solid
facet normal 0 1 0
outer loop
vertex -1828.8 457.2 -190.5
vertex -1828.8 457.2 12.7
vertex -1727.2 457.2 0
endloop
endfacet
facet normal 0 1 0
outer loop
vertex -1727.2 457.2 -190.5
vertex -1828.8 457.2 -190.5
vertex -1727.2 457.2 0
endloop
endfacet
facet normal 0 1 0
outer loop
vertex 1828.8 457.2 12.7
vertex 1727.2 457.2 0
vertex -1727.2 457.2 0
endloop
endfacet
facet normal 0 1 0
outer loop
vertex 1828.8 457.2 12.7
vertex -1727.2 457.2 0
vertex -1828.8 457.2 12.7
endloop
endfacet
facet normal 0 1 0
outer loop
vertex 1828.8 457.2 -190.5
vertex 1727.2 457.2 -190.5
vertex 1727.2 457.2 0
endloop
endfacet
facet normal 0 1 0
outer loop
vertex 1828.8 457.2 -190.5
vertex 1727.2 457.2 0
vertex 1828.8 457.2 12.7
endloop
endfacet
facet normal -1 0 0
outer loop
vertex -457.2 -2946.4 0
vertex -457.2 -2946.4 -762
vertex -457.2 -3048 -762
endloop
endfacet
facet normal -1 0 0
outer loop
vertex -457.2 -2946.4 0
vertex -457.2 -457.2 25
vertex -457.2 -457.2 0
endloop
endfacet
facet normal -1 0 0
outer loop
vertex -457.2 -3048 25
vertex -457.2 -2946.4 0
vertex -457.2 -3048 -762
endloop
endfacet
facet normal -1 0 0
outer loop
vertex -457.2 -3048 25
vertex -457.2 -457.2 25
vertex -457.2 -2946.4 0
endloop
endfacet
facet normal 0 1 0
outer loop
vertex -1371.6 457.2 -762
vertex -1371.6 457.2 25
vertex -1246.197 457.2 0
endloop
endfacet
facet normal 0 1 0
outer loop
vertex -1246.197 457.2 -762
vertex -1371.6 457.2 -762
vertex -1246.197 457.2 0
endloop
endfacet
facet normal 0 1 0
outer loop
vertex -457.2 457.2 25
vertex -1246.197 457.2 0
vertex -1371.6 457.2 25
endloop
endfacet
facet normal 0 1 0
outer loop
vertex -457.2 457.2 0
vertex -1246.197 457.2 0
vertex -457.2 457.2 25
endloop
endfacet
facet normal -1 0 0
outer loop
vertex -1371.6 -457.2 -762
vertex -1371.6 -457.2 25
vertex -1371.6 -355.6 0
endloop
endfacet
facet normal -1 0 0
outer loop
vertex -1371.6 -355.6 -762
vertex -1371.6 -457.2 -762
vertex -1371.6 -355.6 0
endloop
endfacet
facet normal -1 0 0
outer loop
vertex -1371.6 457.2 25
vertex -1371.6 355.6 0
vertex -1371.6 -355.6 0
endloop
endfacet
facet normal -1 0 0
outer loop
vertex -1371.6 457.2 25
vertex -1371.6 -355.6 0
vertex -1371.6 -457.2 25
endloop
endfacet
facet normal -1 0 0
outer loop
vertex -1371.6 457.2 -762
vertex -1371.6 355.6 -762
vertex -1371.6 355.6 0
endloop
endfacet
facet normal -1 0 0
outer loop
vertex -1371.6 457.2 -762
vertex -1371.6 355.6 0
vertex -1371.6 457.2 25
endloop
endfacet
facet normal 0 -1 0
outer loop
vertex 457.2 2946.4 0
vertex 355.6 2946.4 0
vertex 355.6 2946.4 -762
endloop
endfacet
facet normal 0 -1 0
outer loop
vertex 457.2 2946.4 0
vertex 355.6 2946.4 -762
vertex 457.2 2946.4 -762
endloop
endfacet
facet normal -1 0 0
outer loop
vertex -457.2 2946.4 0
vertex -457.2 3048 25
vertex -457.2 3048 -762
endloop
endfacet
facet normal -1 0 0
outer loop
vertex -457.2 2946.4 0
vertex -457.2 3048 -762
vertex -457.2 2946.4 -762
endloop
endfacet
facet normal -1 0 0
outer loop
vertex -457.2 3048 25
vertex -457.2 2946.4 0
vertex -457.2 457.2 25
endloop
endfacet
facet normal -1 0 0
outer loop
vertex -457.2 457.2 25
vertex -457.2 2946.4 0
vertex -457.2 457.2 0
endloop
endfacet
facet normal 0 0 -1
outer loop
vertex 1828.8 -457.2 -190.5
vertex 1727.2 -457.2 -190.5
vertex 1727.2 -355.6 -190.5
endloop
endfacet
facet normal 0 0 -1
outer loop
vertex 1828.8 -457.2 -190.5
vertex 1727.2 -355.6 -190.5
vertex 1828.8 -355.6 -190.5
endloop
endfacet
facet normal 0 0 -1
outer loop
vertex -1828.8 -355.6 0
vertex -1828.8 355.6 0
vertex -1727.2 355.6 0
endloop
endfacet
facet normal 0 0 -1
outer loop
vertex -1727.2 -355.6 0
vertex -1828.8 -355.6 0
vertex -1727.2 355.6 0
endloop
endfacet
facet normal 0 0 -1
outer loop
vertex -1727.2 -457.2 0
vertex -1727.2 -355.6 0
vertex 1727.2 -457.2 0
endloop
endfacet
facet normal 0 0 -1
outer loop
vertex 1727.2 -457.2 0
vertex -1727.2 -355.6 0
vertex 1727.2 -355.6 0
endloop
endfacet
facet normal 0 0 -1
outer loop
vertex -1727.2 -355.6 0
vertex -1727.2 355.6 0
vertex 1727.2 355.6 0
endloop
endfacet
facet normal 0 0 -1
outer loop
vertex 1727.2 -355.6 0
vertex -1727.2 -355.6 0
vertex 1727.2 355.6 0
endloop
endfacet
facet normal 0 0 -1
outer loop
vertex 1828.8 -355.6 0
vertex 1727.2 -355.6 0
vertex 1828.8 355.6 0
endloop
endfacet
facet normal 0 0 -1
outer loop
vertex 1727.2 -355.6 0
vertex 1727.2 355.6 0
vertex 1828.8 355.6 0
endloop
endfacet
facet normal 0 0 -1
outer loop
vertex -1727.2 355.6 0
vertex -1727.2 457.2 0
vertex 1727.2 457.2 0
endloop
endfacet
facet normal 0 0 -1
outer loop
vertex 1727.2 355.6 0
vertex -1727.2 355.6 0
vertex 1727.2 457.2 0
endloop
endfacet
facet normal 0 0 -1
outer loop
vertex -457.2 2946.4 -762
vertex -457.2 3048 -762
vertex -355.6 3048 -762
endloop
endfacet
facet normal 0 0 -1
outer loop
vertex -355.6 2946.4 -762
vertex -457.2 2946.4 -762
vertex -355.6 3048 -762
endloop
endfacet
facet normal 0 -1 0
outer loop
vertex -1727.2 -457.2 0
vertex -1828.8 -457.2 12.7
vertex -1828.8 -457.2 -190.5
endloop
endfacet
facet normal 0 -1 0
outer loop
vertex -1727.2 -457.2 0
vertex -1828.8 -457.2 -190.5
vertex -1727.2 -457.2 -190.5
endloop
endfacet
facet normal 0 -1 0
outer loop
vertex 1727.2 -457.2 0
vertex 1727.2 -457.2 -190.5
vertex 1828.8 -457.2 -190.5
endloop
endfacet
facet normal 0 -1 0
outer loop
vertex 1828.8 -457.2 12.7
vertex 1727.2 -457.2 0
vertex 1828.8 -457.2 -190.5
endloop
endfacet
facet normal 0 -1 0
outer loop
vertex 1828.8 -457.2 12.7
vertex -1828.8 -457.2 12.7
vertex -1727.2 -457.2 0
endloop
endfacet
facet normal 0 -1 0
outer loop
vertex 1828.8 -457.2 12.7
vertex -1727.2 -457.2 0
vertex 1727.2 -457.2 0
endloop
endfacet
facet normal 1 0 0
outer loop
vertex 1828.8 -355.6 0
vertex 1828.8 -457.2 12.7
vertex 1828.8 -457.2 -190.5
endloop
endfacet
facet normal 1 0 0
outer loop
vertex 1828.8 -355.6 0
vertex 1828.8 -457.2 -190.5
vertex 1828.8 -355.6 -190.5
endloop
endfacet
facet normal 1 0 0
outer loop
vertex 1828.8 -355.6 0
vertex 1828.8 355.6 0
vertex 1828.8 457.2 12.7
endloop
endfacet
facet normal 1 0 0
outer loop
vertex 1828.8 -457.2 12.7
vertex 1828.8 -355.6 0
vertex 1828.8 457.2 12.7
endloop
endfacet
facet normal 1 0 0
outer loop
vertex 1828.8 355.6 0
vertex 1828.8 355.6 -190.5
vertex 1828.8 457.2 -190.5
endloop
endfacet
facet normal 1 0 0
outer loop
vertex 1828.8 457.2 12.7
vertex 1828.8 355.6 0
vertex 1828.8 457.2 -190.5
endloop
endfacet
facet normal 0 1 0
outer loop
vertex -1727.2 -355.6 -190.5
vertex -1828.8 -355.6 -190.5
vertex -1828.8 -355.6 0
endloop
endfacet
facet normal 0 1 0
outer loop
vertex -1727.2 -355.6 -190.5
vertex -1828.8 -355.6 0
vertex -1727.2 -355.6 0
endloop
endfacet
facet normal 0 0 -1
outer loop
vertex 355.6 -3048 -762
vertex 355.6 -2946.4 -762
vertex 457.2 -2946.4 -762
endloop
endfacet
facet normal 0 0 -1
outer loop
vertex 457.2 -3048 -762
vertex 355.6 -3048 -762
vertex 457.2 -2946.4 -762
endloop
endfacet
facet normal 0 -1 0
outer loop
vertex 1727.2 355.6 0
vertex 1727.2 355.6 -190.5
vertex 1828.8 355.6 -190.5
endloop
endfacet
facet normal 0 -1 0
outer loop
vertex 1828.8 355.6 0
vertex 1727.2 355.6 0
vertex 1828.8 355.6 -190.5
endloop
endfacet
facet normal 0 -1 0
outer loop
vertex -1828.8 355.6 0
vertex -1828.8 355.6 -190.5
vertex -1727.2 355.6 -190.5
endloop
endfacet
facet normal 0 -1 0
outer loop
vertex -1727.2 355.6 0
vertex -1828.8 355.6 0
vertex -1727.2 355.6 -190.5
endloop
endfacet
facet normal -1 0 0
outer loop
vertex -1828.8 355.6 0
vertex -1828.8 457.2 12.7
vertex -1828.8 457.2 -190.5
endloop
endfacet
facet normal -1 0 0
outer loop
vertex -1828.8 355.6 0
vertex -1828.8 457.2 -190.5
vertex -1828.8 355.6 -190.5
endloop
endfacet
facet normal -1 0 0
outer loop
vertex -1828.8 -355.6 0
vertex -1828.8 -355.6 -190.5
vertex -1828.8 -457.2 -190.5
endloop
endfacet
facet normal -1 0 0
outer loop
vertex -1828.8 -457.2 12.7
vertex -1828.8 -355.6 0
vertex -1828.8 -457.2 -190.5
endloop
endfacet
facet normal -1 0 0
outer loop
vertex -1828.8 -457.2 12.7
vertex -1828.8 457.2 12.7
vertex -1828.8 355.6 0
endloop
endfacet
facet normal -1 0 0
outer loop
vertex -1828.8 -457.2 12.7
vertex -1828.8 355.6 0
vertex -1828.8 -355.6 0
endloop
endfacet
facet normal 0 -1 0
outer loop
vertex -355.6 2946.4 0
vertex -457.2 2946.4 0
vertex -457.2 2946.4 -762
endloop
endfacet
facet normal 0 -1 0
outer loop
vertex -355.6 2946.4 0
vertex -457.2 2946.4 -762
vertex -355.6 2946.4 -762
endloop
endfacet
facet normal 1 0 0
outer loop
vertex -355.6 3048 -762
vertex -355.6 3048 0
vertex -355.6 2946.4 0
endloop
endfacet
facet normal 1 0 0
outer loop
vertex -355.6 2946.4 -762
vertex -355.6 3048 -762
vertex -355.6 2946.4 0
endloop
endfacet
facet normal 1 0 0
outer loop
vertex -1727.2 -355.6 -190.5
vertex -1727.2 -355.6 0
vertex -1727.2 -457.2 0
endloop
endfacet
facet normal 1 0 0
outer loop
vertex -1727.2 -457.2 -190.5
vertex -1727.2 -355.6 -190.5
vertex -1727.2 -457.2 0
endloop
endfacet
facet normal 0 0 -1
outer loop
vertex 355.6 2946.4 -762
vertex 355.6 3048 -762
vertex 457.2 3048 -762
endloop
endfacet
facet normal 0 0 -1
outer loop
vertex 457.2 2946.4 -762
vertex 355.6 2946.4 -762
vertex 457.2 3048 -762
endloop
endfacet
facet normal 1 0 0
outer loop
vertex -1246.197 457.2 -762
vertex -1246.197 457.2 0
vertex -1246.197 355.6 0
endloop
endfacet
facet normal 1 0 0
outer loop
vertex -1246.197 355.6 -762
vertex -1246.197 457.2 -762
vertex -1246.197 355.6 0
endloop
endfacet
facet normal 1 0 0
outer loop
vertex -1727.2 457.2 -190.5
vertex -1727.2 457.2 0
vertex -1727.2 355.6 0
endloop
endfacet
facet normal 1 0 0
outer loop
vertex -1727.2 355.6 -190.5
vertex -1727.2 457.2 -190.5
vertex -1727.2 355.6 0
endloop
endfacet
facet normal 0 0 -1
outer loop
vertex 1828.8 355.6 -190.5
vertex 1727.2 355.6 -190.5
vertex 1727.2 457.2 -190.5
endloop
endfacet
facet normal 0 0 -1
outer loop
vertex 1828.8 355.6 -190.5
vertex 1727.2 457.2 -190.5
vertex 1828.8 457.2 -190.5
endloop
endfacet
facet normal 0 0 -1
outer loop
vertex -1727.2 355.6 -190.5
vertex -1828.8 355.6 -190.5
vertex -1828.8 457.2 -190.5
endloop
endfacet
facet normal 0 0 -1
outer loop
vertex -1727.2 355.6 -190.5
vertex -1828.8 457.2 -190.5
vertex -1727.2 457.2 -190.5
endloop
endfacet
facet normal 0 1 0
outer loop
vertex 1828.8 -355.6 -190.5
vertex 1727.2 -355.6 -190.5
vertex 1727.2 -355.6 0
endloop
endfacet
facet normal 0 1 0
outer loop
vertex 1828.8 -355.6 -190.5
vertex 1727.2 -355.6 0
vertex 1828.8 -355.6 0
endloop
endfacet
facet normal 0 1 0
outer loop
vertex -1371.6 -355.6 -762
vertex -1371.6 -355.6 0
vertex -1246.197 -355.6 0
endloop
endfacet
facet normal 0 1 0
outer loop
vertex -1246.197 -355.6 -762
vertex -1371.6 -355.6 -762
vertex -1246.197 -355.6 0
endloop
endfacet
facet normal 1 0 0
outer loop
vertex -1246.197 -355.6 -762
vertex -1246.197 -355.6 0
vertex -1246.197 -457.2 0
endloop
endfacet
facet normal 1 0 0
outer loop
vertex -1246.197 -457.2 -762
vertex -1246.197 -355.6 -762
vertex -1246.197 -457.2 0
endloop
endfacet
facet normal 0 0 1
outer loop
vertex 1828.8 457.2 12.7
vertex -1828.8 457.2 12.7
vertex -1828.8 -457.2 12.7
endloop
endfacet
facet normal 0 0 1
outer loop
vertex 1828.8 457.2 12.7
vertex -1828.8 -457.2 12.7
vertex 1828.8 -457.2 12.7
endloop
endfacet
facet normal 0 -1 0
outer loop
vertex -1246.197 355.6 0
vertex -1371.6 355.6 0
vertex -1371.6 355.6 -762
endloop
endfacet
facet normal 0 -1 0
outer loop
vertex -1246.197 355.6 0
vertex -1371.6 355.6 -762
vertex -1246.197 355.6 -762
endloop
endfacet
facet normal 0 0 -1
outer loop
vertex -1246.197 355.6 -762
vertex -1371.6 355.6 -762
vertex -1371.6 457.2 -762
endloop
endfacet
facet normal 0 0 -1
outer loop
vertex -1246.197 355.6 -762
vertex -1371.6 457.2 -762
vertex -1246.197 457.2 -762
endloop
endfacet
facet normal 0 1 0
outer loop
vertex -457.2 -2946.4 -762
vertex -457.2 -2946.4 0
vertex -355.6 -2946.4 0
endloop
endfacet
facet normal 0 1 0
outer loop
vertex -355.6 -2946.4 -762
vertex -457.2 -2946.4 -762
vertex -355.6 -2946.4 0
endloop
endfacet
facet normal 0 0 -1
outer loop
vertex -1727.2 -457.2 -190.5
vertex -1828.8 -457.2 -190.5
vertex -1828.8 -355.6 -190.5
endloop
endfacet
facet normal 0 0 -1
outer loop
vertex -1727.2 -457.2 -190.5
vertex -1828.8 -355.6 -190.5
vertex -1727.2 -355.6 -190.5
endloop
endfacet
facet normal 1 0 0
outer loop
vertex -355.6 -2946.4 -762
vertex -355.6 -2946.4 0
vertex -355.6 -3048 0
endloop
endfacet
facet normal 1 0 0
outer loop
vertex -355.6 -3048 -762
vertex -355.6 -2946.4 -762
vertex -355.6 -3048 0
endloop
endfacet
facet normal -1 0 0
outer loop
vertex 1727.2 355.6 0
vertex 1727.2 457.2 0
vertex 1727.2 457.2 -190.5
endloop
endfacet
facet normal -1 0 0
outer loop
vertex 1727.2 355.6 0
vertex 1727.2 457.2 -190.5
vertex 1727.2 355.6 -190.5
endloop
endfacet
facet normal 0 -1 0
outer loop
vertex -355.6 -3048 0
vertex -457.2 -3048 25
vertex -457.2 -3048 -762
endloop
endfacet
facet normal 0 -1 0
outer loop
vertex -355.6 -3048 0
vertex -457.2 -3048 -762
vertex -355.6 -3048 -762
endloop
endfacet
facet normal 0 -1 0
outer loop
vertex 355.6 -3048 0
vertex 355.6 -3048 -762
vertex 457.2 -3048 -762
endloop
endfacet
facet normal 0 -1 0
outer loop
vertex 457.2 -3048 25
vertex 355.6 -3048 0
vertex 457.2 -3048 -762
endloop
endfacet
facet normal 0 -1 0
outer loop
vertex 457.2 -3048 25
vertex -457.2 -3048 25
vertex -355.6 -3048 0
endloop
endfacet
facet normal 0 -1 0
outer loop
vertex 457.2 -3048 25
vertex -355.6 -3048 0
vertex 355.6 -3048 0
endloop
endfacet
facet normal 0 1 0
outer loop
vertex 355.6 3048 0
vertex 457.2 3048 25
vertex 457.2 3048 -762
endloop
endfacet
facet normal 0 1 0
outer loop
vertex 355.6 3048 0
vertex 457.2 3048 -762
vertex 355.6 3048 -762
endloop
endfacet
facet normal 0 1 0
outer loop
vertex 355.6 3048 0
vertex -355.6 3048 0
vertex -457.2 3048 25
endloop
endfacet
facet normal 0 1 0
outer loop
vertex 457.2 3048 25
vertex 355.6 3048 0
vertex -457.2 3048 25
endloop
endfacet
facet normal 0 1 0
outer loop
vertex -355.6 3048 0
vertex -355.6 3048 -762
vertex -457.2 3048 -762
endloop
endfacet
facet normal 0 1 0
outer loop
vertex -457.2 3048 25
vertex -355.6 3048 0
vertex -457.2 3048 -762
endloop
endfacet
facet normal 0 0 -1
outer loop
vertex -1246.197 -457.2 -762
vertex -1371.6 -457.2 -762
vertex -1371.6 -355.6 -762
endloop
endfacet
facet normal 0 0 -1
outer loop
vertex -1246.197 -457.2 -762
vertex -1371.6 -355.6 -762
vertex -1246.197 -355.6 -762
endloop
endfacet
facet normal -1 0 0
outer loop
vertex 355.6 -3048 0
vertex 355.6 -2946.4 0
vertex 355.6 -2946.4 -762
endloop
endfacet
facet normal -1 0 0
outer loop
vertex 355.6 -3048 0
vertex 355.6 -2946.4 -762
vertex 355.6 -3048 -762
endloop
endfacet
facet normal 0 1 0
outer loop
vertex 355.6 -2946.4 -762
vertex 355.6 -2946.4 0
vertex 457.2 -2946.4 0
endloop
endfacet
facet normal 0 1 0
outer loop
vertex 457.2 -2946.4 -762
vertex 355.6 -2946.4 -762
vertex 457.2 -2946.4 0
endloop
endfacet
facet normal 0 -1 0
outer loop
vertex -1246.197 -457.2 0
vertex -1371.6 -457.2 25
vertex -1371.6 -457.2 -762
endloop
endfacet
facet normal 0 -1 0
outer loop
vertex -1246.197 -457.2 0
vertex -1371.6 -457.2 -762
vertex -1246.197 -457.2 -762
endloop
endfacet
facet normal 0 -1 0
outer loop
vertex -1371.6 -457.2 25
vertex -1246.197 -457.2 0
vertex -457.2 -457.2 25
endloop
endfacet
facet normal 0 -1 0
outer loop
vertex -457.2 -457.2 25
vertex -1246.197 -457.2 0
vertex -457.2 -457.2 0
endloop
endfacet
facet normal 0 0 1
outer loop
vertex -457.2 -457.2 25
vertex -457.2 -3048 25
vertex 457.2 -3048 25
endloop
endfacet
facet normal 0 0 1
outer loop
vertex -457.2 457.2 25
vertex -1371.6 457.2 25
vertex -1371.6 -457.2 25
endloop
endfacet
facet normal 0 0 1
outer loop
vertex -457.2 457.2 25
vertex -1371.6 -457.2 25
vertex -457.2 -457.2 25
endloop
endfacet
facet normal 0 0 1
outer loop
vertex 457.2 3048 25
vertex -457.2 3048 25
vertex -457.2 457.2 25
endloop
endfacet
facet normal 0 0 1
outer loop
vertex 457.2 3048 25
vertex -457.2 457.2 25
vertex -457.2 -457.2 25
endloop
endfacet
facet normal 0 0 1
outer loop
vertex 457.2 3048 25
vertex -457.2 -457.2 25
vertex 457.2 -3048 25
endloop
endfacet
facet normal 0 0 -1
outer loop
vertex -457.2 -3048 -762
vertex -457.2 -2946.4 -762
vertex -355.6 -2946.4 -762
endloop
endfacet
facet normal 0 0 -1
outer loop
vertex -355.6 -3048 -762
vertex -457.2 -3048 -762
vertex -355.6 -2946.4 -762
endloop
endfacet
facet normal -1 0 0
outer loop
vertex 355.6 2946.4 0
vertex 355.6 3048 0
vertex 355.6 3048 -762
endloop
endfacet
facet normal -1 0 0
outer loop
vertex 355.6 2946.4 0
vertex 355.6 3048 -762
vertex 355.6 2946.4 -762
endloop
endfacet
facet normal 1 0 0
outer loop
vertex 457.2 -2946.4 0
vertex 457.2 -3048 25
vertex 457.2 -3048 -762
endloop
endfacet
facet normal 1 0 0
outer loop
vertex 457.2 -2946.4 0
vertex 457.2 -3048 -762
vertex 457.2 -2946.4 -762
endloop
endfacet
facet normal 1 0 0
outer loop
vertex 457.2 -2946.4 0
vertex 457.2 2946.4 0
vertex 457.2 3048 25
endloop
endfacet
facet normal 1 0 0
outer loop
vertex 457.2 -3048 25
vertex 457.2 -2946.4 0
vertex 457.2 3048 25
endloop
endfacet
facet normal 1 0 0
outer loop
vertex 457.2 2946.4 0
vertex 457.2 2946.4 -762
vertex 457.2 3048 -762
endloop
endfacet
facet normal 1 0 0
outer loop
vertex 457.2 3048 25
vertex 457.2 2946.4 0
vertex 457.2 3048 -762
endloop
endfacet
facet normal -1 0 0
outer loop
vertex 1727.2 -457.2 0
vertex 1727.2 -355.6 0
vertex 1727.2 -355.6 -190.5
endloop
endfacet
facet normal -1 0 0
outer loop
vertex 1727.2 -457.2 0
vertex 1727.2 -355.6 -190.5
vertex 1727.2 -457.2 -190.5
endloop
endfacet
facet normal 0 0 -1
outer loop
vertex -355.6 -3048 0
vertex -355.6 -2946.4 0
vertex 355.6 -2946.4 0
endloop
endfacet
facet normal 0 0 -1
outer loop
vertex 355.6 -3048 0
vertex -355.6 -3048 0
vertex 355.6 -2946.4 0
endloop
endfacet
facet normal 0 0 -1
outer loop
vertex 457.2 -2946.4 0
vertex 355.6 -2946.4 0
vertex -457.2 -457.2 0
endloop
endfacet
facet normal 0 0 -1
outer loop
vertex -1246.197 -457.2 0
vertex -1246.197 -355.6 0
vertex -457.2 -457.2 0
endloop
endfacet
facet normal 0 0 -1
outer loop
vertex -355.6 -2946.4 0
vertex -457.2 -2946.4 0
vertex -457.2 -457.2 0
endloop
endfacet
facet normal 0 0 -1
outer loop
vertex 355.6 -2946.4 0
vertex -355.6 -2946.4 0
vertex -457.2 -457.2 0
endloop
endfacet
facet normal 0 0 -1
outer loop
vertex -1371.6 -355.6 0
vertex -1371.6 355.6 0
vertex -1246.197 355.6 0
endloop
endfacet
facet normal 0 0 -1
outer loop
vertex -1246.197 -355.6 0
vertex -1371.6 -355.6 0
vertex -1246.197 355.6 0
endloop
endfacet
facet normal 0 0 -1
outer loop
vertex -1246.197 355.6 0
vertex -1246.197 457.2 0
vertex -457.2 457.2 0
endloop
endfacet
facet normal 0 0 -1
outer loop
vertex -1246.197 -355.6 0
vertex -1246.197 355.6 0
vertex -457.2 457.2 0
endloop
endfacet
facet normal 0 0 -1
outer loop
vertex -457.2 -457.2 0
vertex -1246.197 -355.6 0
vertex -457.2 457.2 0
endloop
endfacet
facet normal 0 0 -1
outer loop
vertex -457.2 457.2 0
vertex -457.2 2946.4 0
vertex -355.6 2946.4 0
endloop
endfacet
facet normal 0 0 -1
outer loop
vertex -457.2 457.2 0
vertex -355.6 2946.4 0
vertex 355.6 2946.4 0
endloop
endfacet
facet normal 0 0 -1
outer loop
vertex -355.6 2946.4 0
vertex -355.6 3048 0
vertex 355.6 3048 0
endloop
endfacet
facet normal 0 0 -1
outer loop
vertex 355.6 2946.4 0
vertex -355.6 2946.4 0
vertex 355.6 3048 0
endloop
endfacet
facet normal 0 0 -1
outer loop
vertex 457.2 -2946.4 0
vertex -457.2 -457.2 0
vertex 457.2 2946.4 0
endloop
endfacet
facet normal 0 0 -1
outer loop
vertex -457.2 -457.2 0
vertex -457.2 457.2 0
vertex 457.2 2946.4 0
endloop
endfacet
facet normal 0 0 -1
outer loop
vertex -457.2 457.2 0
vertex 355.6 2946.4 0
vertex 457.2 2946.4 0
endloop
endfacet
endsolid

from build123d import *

# Parameters (mm, degrees)
F0_W     = 3657.6
F0_H     = 914.4
F1_DEPTH = 12.7
F2_W     = 101.6
F2_H     = 101.6
F3_DEPTH = 190.5
F4_W     = 914.4
F4_H     = 914.4
F5_DEPTH = 25
F6_W     = 101.6
F6_H     = 101.6
F6_W_2   = 125.4026571274
F7_DEPTH = 762


with BuildPart() as f1:
    # F0 (on Top) → F1 (new body)
    with BuildSketch(Plane.XY):
        Rectangle(F0_W, F0_H)
    extrude(amount=F1_DEPTH)

    # F2 (on face) → F3 (join)
    with BuildSketch(Plane(origin=(0, 0, 0), x_dir=(1, 0, 0), z_dir=(0, 0, -1))):
        with Locations((-1778, 406.4)):
            Rectangle(F2_W, F2_H)
        with Locations((1778, 406.4)):
            Rectangle(F2_W, F2_H)
        with Locations((-1778, -406.4)):
            Rectangle(F2_W, F2_H)
        with Locations((1778, -406.4)):
            Rectangle(F2_W, F2_H)
    extrude(amount=F3_DEPTH)


with BuildPart() as f5:
    # F4 (on Top) → F5 (new body)
    with BuildSketch(Plane.XY):
        Polygon((-457.2, -3048), (457.2, -3048), (457.2, 3048), (-457.2, 3048), (-457.2, 457.2), (-457.2, -457.2), align=None)
        with Locations((-914.4, 0)):
            Rectangle(F4_W, F4_H)
    extrude(amount=F5_DEPTH)

    # F6 (on face) → F7 (join)
    with BuildSketch(Plane(origin=(0, 0, 0), x_dir=(1, 0, 0), z_dir=(0, 0, -1))):
        with Locations((-406.4, 2997.2)):
            Rectangle(F6_W, F6_H)
        with Locations((406.4, 2997.2)):
            Rectangle(F6_W, F6_H)
        with Locations((-406.4, -2997.2)):
            Rectangle(F6_W, F6_H)
        with Locations((406.4, -2997.2)):
            Rectangle(F6_W, F6_H)
        with Locations((-1308.8986714363, 406.4)):
            Rectangle(F6_W_2, F6_H)
        with Locations((-1308.8986714363, -406.4)):
            Rectangle(F6_W_2, F6_H)
    extrude(amount=F7_DEPTH)


solid = Compound([f1.part, f5.part])
